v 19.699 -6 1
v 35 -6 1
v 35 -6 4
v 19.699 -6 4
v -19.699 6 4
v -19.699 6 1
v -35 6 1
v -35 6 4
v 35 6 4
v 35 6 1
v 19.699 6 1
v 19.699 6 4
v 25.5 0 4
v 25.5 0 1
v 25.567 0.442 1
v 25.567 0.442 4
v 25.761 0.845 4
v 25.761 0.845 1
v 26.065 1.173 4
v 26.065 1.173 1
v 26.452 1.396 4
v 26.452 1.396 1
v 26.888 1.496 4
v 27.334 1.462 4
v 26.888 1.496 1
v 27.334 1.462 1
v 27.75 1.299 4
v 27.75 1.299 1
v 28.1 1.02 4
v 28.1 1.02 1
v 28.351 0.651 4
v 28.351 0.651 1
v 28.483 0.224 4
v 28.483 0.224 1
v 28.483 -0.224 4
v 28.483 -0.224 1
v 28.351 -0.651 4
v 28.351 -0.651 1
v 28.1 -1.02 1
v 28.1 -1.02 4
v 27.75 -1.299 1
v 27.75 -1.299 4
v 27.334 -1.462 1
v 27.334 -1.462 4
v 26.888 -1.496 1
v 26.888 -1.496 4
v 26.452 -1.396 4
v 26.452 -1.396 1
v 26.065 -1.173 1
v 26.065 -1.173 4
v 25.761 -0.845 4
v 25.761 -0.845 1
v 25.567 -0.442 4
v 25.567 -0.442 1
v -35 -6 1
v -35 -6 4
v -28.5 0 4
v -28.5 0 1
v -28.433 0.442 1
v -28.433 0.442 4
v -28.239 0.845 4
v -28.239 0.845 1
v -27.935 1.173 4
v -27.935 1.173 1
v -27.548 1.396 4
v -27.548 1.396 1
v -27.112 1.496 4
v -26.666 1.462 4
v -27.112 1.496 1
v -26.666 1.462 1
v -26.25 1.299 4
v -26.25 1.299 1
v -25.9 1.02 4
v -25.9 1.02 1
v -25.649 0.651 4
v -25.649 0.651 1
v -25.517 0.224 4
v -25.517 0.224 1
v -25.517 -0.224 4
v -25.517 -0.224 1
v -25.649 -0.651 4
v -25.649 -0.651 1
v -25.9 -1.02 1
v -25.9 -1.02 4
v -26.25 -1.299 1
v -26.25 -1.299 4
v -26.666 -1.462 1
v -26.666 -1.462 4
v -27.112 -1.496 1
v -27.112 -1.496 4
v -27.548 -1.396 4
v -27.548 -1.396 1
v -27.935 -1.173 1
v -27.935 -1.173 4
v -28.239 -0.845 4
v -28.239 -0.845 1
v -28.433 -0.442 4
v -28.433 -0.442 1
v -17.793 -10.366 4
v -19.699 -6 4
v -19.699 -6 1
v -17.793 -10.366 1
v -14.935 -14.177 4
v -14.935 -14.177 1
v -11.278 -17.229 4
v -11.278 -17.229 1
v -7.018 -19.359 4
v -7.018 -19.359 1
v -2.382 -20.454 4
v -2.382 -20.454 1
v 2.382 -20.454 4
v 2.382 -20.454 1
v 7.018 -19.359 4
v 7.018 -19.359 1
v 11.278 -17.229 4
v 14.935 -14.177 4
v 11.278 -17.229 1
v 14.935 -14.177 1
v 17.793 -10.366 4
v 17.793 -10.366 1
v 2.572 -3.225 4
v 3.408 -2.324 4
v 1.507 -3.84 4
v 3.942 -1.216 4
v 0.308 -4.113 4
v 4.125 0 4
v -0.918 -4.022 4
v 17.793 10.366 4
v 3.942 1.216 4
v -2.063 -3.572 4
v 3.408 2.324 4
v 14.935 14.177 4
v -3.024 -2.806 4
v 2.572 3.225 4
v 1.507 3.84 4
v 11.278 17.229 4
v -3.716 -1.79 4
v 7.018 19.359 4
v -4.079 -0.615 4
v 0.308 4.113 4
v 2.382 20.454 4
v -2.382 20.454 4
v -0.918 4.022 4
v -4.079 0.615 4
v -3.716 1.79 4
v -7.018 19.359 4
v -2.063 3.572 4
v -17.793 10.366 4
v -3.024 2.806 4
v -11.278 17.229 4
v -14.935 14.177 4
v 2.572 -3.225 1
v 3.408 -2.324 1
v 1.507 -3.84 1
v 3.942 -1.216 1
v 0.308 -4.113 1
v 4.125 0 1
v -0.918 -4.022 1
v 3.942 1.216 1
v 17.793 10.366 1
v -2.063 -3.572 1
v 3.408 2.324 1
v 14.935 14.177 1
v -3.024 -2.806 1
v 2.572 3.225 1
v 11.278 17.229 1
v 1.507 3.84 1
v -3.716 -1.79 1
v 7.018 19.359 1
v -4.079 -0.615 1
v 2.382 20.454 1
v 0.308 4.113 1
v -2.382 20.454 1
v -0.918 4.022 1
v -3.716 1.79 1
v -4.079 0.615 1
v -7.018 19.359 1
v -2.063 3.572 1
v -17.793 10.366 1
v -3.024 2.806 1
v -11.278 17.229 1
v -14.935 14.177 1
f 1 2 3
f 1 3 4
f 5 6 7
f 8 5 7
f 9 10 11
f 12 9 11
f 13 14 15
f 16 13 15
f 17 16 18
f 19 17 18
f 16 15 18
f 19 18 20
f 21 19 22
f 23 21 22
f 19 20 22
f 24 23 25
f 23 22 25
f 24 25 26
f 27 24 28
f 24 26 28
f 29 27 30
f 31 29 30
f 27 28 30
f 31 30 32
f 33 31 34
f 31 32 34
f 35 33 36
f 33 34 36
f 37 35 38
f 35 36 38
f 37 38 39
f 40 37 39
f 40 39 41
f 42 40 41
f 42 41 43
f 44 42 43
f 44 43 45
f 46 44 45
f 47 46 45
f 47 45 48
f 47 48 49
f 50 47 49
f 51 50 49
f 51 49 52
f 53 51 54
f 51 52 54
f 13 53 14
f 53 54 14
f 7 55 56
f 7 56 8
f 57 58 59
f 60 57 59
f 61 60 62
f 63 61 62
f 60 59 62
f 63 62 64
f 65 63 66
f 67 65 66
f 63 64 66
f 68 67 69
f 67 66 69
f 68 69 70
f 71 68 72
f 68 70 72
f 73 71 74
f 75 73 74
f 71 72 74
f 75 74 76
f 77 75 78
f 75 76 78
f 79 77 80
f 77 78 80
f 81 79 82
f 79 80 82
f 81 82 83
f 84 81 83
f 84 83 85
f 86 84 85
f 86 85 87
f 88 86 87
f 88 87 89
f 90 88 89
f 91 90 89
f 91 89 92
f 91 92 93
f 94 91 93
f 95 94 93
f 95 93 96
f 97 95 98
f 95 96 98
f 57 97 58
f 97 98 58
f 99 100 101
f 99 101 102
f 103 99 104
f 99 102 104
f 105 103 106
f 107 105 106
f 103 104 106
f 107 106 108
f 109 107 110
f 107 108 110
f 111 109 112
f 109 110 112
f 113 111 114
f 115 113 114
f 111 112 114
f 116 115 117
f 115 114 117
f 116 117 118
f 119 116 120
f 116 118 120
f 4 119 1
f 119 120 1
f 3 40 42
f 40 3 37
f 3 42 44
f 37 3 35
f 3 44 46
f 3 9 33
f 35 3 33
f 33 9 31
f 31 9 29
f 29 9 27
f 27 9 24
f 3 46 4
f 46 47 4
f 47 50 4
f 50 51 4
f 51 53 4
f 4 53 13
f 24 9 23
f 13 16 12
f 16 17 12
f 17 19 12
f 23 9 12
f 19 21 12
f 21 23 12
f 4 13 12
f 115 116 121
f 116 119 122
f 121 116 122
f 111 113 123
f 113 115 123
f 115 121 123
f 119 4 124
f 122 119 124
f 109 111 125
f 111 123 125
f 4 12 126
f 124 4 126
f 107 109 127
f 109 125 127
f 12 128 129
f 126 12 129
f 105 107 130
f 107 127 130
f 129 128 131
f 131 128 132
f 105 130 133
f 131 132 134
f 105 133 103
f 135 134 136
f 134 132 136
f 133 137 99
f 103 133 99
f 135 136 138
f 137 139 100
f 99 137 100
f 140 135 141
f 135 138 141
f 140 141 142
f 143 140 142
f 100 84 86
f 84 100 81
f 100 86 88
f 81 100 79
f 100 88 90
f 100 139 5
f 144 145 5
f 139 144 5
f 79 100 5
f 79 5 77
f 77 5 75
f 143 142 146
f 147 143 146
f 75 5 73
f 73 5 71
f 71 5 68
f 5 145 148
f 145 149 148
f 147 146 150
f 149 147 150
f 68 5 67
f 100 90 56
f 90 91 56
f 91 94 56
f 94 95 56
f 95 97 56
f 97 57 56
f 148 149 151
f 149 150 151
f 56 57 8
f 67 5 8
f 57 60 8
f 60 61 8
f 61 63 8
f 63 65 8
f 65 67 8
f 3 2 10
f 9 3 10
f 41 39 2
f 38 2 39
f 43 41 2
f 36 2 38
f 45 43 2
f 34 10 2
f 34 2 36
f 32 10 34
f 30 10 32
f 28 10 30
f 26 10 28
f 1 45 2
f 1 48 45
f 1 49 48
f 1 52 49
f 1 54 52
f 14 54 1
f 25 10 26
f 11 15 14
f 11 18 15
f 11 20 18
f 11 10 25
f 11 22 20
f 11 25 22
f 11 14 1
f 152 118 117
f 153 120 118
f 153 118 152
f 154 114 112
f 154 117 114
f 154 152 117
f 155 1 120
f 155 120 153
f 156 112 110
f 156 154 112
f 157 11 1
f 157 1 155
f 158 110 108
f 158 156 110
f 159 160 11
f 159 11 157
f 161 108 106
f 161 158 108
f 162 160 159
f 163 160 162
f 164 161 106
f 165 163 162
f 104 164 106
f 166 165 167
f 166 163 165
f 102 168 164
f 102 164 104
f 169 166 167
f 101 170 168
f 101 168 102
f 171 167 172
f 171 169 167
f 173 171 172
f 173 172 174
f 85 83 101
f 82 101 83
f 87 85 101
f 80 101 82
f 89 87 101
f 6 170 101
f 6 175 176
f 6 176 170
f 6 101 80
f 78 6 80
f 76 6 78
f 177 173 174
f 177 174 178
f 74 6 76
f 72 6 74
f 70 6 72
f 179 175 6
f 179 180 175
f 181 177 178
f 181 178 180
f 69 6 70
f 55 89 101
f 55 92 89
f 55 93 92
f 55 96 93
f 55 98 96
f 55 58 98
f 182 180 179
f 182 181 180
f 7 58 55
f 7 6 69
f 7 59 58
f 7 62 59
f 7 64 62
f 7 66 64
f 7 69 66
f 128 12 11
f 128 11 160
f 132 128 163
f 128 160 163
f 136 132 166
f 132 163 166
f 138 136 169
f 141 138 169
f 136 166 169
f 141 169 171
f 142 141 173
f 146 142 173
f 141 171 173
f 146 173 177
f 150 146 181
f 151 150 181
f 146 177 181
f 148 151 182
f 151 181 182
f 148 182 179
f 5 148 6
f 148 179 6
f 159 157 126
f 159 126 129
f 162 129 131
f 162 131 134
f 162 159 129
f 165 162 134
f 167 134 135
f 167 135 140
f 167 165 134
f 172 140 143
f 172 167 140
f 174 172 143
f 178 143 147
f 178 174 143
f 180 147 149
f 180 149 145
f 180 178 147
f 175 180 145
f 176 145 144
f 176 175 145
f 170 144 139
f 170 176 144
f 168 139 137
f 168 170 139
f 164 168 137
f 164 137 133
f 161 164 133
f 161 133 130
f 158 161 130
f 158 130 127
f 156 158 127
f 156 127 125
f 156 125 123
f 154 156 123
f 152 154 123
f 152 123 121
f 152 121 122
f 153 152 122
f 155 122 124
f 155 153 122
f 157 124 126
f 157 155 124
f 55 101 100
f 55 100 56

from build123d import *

# Parameters (mm, degrees)
SKETCH2_R           = 20.592109163
SKETCH2_R_2         = 4.125
BOSS_EXTRUDE1_DEPTH = 3
SKETCH3_W           = 70
SKETCH3_H           = 12
SKETCH3_R           = 1.5
SKETCH3_R_2         = 4.125
BOSS_EXTRUDE2_DEPTH = 3


# Read off the part's stored shape, not the designer's step: Gear 60pitch part02.STEP
with BuildPart() as part:
    # Sketch2 → Boss-Extrude1 (new body)
    with BuildSketch(Plane.XY.offset(1)):
        Circle(SKETCH2_R)
        Circle(SKETCH2_R_2, mode=Mode.SUBTRACT)
    extrude(amount=BOSS_EXTRUDE1_DEPTH)

    # Sketch3 → Boss-Extrude2 (add)
    with BuildSketch(Plane(origin=(0, 0, 1), x_dir=(-1, 0, 0), z_dir=(0, 0, -1))):
        Rectangle(SKETCH3_W, SKETCH3_H)
        with Locations((-27, 0)):
            Circle(SKETCH3_R, mode=Mode.SUBTRACT)
        with Locations((27, 0)):
            Circle(SKETCH3_R, mode=Mode.SUBTRACT)
        with Locations(Location((0, 0, 0), (0, 0, 180))):
            Circle(SKETCH3_R_2, mode=Mode.SUBTRACT)
    extrude(amount=-BOSS_EXTRUDE2_DEPTH)


solid = part.part
